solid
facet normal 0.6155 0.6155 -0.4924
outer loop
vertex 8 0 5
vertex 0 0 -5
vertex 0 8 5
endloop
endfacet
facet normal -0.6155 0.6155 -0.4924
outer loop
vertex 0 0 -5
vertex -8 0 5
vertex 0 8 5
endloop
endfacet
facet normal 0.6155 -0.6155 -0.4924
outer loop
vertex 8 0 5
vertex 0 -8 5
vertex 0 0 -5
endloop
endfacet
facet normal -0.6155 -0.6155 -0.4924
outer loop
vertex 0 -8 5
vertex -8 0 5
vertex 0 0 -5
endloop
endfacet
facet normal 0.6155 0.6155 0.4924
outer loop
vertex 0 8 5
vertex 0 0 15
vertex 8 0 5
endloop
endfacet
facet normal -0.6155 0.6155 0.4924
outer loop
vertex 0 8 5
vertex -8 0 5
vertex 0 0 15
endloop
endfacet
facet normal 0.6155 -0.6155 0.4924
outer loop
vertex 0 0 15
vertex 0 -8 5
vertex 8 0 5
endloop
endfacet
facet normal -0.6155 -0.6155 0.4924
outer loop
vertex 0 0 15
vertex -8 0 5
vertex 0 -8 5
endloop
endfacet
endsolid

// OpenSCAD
cylinder(10,0,8, $fn = 4, center = true);

translate([0,0,10])
cylinder(10,8,0, $fn = 4, center = true);
